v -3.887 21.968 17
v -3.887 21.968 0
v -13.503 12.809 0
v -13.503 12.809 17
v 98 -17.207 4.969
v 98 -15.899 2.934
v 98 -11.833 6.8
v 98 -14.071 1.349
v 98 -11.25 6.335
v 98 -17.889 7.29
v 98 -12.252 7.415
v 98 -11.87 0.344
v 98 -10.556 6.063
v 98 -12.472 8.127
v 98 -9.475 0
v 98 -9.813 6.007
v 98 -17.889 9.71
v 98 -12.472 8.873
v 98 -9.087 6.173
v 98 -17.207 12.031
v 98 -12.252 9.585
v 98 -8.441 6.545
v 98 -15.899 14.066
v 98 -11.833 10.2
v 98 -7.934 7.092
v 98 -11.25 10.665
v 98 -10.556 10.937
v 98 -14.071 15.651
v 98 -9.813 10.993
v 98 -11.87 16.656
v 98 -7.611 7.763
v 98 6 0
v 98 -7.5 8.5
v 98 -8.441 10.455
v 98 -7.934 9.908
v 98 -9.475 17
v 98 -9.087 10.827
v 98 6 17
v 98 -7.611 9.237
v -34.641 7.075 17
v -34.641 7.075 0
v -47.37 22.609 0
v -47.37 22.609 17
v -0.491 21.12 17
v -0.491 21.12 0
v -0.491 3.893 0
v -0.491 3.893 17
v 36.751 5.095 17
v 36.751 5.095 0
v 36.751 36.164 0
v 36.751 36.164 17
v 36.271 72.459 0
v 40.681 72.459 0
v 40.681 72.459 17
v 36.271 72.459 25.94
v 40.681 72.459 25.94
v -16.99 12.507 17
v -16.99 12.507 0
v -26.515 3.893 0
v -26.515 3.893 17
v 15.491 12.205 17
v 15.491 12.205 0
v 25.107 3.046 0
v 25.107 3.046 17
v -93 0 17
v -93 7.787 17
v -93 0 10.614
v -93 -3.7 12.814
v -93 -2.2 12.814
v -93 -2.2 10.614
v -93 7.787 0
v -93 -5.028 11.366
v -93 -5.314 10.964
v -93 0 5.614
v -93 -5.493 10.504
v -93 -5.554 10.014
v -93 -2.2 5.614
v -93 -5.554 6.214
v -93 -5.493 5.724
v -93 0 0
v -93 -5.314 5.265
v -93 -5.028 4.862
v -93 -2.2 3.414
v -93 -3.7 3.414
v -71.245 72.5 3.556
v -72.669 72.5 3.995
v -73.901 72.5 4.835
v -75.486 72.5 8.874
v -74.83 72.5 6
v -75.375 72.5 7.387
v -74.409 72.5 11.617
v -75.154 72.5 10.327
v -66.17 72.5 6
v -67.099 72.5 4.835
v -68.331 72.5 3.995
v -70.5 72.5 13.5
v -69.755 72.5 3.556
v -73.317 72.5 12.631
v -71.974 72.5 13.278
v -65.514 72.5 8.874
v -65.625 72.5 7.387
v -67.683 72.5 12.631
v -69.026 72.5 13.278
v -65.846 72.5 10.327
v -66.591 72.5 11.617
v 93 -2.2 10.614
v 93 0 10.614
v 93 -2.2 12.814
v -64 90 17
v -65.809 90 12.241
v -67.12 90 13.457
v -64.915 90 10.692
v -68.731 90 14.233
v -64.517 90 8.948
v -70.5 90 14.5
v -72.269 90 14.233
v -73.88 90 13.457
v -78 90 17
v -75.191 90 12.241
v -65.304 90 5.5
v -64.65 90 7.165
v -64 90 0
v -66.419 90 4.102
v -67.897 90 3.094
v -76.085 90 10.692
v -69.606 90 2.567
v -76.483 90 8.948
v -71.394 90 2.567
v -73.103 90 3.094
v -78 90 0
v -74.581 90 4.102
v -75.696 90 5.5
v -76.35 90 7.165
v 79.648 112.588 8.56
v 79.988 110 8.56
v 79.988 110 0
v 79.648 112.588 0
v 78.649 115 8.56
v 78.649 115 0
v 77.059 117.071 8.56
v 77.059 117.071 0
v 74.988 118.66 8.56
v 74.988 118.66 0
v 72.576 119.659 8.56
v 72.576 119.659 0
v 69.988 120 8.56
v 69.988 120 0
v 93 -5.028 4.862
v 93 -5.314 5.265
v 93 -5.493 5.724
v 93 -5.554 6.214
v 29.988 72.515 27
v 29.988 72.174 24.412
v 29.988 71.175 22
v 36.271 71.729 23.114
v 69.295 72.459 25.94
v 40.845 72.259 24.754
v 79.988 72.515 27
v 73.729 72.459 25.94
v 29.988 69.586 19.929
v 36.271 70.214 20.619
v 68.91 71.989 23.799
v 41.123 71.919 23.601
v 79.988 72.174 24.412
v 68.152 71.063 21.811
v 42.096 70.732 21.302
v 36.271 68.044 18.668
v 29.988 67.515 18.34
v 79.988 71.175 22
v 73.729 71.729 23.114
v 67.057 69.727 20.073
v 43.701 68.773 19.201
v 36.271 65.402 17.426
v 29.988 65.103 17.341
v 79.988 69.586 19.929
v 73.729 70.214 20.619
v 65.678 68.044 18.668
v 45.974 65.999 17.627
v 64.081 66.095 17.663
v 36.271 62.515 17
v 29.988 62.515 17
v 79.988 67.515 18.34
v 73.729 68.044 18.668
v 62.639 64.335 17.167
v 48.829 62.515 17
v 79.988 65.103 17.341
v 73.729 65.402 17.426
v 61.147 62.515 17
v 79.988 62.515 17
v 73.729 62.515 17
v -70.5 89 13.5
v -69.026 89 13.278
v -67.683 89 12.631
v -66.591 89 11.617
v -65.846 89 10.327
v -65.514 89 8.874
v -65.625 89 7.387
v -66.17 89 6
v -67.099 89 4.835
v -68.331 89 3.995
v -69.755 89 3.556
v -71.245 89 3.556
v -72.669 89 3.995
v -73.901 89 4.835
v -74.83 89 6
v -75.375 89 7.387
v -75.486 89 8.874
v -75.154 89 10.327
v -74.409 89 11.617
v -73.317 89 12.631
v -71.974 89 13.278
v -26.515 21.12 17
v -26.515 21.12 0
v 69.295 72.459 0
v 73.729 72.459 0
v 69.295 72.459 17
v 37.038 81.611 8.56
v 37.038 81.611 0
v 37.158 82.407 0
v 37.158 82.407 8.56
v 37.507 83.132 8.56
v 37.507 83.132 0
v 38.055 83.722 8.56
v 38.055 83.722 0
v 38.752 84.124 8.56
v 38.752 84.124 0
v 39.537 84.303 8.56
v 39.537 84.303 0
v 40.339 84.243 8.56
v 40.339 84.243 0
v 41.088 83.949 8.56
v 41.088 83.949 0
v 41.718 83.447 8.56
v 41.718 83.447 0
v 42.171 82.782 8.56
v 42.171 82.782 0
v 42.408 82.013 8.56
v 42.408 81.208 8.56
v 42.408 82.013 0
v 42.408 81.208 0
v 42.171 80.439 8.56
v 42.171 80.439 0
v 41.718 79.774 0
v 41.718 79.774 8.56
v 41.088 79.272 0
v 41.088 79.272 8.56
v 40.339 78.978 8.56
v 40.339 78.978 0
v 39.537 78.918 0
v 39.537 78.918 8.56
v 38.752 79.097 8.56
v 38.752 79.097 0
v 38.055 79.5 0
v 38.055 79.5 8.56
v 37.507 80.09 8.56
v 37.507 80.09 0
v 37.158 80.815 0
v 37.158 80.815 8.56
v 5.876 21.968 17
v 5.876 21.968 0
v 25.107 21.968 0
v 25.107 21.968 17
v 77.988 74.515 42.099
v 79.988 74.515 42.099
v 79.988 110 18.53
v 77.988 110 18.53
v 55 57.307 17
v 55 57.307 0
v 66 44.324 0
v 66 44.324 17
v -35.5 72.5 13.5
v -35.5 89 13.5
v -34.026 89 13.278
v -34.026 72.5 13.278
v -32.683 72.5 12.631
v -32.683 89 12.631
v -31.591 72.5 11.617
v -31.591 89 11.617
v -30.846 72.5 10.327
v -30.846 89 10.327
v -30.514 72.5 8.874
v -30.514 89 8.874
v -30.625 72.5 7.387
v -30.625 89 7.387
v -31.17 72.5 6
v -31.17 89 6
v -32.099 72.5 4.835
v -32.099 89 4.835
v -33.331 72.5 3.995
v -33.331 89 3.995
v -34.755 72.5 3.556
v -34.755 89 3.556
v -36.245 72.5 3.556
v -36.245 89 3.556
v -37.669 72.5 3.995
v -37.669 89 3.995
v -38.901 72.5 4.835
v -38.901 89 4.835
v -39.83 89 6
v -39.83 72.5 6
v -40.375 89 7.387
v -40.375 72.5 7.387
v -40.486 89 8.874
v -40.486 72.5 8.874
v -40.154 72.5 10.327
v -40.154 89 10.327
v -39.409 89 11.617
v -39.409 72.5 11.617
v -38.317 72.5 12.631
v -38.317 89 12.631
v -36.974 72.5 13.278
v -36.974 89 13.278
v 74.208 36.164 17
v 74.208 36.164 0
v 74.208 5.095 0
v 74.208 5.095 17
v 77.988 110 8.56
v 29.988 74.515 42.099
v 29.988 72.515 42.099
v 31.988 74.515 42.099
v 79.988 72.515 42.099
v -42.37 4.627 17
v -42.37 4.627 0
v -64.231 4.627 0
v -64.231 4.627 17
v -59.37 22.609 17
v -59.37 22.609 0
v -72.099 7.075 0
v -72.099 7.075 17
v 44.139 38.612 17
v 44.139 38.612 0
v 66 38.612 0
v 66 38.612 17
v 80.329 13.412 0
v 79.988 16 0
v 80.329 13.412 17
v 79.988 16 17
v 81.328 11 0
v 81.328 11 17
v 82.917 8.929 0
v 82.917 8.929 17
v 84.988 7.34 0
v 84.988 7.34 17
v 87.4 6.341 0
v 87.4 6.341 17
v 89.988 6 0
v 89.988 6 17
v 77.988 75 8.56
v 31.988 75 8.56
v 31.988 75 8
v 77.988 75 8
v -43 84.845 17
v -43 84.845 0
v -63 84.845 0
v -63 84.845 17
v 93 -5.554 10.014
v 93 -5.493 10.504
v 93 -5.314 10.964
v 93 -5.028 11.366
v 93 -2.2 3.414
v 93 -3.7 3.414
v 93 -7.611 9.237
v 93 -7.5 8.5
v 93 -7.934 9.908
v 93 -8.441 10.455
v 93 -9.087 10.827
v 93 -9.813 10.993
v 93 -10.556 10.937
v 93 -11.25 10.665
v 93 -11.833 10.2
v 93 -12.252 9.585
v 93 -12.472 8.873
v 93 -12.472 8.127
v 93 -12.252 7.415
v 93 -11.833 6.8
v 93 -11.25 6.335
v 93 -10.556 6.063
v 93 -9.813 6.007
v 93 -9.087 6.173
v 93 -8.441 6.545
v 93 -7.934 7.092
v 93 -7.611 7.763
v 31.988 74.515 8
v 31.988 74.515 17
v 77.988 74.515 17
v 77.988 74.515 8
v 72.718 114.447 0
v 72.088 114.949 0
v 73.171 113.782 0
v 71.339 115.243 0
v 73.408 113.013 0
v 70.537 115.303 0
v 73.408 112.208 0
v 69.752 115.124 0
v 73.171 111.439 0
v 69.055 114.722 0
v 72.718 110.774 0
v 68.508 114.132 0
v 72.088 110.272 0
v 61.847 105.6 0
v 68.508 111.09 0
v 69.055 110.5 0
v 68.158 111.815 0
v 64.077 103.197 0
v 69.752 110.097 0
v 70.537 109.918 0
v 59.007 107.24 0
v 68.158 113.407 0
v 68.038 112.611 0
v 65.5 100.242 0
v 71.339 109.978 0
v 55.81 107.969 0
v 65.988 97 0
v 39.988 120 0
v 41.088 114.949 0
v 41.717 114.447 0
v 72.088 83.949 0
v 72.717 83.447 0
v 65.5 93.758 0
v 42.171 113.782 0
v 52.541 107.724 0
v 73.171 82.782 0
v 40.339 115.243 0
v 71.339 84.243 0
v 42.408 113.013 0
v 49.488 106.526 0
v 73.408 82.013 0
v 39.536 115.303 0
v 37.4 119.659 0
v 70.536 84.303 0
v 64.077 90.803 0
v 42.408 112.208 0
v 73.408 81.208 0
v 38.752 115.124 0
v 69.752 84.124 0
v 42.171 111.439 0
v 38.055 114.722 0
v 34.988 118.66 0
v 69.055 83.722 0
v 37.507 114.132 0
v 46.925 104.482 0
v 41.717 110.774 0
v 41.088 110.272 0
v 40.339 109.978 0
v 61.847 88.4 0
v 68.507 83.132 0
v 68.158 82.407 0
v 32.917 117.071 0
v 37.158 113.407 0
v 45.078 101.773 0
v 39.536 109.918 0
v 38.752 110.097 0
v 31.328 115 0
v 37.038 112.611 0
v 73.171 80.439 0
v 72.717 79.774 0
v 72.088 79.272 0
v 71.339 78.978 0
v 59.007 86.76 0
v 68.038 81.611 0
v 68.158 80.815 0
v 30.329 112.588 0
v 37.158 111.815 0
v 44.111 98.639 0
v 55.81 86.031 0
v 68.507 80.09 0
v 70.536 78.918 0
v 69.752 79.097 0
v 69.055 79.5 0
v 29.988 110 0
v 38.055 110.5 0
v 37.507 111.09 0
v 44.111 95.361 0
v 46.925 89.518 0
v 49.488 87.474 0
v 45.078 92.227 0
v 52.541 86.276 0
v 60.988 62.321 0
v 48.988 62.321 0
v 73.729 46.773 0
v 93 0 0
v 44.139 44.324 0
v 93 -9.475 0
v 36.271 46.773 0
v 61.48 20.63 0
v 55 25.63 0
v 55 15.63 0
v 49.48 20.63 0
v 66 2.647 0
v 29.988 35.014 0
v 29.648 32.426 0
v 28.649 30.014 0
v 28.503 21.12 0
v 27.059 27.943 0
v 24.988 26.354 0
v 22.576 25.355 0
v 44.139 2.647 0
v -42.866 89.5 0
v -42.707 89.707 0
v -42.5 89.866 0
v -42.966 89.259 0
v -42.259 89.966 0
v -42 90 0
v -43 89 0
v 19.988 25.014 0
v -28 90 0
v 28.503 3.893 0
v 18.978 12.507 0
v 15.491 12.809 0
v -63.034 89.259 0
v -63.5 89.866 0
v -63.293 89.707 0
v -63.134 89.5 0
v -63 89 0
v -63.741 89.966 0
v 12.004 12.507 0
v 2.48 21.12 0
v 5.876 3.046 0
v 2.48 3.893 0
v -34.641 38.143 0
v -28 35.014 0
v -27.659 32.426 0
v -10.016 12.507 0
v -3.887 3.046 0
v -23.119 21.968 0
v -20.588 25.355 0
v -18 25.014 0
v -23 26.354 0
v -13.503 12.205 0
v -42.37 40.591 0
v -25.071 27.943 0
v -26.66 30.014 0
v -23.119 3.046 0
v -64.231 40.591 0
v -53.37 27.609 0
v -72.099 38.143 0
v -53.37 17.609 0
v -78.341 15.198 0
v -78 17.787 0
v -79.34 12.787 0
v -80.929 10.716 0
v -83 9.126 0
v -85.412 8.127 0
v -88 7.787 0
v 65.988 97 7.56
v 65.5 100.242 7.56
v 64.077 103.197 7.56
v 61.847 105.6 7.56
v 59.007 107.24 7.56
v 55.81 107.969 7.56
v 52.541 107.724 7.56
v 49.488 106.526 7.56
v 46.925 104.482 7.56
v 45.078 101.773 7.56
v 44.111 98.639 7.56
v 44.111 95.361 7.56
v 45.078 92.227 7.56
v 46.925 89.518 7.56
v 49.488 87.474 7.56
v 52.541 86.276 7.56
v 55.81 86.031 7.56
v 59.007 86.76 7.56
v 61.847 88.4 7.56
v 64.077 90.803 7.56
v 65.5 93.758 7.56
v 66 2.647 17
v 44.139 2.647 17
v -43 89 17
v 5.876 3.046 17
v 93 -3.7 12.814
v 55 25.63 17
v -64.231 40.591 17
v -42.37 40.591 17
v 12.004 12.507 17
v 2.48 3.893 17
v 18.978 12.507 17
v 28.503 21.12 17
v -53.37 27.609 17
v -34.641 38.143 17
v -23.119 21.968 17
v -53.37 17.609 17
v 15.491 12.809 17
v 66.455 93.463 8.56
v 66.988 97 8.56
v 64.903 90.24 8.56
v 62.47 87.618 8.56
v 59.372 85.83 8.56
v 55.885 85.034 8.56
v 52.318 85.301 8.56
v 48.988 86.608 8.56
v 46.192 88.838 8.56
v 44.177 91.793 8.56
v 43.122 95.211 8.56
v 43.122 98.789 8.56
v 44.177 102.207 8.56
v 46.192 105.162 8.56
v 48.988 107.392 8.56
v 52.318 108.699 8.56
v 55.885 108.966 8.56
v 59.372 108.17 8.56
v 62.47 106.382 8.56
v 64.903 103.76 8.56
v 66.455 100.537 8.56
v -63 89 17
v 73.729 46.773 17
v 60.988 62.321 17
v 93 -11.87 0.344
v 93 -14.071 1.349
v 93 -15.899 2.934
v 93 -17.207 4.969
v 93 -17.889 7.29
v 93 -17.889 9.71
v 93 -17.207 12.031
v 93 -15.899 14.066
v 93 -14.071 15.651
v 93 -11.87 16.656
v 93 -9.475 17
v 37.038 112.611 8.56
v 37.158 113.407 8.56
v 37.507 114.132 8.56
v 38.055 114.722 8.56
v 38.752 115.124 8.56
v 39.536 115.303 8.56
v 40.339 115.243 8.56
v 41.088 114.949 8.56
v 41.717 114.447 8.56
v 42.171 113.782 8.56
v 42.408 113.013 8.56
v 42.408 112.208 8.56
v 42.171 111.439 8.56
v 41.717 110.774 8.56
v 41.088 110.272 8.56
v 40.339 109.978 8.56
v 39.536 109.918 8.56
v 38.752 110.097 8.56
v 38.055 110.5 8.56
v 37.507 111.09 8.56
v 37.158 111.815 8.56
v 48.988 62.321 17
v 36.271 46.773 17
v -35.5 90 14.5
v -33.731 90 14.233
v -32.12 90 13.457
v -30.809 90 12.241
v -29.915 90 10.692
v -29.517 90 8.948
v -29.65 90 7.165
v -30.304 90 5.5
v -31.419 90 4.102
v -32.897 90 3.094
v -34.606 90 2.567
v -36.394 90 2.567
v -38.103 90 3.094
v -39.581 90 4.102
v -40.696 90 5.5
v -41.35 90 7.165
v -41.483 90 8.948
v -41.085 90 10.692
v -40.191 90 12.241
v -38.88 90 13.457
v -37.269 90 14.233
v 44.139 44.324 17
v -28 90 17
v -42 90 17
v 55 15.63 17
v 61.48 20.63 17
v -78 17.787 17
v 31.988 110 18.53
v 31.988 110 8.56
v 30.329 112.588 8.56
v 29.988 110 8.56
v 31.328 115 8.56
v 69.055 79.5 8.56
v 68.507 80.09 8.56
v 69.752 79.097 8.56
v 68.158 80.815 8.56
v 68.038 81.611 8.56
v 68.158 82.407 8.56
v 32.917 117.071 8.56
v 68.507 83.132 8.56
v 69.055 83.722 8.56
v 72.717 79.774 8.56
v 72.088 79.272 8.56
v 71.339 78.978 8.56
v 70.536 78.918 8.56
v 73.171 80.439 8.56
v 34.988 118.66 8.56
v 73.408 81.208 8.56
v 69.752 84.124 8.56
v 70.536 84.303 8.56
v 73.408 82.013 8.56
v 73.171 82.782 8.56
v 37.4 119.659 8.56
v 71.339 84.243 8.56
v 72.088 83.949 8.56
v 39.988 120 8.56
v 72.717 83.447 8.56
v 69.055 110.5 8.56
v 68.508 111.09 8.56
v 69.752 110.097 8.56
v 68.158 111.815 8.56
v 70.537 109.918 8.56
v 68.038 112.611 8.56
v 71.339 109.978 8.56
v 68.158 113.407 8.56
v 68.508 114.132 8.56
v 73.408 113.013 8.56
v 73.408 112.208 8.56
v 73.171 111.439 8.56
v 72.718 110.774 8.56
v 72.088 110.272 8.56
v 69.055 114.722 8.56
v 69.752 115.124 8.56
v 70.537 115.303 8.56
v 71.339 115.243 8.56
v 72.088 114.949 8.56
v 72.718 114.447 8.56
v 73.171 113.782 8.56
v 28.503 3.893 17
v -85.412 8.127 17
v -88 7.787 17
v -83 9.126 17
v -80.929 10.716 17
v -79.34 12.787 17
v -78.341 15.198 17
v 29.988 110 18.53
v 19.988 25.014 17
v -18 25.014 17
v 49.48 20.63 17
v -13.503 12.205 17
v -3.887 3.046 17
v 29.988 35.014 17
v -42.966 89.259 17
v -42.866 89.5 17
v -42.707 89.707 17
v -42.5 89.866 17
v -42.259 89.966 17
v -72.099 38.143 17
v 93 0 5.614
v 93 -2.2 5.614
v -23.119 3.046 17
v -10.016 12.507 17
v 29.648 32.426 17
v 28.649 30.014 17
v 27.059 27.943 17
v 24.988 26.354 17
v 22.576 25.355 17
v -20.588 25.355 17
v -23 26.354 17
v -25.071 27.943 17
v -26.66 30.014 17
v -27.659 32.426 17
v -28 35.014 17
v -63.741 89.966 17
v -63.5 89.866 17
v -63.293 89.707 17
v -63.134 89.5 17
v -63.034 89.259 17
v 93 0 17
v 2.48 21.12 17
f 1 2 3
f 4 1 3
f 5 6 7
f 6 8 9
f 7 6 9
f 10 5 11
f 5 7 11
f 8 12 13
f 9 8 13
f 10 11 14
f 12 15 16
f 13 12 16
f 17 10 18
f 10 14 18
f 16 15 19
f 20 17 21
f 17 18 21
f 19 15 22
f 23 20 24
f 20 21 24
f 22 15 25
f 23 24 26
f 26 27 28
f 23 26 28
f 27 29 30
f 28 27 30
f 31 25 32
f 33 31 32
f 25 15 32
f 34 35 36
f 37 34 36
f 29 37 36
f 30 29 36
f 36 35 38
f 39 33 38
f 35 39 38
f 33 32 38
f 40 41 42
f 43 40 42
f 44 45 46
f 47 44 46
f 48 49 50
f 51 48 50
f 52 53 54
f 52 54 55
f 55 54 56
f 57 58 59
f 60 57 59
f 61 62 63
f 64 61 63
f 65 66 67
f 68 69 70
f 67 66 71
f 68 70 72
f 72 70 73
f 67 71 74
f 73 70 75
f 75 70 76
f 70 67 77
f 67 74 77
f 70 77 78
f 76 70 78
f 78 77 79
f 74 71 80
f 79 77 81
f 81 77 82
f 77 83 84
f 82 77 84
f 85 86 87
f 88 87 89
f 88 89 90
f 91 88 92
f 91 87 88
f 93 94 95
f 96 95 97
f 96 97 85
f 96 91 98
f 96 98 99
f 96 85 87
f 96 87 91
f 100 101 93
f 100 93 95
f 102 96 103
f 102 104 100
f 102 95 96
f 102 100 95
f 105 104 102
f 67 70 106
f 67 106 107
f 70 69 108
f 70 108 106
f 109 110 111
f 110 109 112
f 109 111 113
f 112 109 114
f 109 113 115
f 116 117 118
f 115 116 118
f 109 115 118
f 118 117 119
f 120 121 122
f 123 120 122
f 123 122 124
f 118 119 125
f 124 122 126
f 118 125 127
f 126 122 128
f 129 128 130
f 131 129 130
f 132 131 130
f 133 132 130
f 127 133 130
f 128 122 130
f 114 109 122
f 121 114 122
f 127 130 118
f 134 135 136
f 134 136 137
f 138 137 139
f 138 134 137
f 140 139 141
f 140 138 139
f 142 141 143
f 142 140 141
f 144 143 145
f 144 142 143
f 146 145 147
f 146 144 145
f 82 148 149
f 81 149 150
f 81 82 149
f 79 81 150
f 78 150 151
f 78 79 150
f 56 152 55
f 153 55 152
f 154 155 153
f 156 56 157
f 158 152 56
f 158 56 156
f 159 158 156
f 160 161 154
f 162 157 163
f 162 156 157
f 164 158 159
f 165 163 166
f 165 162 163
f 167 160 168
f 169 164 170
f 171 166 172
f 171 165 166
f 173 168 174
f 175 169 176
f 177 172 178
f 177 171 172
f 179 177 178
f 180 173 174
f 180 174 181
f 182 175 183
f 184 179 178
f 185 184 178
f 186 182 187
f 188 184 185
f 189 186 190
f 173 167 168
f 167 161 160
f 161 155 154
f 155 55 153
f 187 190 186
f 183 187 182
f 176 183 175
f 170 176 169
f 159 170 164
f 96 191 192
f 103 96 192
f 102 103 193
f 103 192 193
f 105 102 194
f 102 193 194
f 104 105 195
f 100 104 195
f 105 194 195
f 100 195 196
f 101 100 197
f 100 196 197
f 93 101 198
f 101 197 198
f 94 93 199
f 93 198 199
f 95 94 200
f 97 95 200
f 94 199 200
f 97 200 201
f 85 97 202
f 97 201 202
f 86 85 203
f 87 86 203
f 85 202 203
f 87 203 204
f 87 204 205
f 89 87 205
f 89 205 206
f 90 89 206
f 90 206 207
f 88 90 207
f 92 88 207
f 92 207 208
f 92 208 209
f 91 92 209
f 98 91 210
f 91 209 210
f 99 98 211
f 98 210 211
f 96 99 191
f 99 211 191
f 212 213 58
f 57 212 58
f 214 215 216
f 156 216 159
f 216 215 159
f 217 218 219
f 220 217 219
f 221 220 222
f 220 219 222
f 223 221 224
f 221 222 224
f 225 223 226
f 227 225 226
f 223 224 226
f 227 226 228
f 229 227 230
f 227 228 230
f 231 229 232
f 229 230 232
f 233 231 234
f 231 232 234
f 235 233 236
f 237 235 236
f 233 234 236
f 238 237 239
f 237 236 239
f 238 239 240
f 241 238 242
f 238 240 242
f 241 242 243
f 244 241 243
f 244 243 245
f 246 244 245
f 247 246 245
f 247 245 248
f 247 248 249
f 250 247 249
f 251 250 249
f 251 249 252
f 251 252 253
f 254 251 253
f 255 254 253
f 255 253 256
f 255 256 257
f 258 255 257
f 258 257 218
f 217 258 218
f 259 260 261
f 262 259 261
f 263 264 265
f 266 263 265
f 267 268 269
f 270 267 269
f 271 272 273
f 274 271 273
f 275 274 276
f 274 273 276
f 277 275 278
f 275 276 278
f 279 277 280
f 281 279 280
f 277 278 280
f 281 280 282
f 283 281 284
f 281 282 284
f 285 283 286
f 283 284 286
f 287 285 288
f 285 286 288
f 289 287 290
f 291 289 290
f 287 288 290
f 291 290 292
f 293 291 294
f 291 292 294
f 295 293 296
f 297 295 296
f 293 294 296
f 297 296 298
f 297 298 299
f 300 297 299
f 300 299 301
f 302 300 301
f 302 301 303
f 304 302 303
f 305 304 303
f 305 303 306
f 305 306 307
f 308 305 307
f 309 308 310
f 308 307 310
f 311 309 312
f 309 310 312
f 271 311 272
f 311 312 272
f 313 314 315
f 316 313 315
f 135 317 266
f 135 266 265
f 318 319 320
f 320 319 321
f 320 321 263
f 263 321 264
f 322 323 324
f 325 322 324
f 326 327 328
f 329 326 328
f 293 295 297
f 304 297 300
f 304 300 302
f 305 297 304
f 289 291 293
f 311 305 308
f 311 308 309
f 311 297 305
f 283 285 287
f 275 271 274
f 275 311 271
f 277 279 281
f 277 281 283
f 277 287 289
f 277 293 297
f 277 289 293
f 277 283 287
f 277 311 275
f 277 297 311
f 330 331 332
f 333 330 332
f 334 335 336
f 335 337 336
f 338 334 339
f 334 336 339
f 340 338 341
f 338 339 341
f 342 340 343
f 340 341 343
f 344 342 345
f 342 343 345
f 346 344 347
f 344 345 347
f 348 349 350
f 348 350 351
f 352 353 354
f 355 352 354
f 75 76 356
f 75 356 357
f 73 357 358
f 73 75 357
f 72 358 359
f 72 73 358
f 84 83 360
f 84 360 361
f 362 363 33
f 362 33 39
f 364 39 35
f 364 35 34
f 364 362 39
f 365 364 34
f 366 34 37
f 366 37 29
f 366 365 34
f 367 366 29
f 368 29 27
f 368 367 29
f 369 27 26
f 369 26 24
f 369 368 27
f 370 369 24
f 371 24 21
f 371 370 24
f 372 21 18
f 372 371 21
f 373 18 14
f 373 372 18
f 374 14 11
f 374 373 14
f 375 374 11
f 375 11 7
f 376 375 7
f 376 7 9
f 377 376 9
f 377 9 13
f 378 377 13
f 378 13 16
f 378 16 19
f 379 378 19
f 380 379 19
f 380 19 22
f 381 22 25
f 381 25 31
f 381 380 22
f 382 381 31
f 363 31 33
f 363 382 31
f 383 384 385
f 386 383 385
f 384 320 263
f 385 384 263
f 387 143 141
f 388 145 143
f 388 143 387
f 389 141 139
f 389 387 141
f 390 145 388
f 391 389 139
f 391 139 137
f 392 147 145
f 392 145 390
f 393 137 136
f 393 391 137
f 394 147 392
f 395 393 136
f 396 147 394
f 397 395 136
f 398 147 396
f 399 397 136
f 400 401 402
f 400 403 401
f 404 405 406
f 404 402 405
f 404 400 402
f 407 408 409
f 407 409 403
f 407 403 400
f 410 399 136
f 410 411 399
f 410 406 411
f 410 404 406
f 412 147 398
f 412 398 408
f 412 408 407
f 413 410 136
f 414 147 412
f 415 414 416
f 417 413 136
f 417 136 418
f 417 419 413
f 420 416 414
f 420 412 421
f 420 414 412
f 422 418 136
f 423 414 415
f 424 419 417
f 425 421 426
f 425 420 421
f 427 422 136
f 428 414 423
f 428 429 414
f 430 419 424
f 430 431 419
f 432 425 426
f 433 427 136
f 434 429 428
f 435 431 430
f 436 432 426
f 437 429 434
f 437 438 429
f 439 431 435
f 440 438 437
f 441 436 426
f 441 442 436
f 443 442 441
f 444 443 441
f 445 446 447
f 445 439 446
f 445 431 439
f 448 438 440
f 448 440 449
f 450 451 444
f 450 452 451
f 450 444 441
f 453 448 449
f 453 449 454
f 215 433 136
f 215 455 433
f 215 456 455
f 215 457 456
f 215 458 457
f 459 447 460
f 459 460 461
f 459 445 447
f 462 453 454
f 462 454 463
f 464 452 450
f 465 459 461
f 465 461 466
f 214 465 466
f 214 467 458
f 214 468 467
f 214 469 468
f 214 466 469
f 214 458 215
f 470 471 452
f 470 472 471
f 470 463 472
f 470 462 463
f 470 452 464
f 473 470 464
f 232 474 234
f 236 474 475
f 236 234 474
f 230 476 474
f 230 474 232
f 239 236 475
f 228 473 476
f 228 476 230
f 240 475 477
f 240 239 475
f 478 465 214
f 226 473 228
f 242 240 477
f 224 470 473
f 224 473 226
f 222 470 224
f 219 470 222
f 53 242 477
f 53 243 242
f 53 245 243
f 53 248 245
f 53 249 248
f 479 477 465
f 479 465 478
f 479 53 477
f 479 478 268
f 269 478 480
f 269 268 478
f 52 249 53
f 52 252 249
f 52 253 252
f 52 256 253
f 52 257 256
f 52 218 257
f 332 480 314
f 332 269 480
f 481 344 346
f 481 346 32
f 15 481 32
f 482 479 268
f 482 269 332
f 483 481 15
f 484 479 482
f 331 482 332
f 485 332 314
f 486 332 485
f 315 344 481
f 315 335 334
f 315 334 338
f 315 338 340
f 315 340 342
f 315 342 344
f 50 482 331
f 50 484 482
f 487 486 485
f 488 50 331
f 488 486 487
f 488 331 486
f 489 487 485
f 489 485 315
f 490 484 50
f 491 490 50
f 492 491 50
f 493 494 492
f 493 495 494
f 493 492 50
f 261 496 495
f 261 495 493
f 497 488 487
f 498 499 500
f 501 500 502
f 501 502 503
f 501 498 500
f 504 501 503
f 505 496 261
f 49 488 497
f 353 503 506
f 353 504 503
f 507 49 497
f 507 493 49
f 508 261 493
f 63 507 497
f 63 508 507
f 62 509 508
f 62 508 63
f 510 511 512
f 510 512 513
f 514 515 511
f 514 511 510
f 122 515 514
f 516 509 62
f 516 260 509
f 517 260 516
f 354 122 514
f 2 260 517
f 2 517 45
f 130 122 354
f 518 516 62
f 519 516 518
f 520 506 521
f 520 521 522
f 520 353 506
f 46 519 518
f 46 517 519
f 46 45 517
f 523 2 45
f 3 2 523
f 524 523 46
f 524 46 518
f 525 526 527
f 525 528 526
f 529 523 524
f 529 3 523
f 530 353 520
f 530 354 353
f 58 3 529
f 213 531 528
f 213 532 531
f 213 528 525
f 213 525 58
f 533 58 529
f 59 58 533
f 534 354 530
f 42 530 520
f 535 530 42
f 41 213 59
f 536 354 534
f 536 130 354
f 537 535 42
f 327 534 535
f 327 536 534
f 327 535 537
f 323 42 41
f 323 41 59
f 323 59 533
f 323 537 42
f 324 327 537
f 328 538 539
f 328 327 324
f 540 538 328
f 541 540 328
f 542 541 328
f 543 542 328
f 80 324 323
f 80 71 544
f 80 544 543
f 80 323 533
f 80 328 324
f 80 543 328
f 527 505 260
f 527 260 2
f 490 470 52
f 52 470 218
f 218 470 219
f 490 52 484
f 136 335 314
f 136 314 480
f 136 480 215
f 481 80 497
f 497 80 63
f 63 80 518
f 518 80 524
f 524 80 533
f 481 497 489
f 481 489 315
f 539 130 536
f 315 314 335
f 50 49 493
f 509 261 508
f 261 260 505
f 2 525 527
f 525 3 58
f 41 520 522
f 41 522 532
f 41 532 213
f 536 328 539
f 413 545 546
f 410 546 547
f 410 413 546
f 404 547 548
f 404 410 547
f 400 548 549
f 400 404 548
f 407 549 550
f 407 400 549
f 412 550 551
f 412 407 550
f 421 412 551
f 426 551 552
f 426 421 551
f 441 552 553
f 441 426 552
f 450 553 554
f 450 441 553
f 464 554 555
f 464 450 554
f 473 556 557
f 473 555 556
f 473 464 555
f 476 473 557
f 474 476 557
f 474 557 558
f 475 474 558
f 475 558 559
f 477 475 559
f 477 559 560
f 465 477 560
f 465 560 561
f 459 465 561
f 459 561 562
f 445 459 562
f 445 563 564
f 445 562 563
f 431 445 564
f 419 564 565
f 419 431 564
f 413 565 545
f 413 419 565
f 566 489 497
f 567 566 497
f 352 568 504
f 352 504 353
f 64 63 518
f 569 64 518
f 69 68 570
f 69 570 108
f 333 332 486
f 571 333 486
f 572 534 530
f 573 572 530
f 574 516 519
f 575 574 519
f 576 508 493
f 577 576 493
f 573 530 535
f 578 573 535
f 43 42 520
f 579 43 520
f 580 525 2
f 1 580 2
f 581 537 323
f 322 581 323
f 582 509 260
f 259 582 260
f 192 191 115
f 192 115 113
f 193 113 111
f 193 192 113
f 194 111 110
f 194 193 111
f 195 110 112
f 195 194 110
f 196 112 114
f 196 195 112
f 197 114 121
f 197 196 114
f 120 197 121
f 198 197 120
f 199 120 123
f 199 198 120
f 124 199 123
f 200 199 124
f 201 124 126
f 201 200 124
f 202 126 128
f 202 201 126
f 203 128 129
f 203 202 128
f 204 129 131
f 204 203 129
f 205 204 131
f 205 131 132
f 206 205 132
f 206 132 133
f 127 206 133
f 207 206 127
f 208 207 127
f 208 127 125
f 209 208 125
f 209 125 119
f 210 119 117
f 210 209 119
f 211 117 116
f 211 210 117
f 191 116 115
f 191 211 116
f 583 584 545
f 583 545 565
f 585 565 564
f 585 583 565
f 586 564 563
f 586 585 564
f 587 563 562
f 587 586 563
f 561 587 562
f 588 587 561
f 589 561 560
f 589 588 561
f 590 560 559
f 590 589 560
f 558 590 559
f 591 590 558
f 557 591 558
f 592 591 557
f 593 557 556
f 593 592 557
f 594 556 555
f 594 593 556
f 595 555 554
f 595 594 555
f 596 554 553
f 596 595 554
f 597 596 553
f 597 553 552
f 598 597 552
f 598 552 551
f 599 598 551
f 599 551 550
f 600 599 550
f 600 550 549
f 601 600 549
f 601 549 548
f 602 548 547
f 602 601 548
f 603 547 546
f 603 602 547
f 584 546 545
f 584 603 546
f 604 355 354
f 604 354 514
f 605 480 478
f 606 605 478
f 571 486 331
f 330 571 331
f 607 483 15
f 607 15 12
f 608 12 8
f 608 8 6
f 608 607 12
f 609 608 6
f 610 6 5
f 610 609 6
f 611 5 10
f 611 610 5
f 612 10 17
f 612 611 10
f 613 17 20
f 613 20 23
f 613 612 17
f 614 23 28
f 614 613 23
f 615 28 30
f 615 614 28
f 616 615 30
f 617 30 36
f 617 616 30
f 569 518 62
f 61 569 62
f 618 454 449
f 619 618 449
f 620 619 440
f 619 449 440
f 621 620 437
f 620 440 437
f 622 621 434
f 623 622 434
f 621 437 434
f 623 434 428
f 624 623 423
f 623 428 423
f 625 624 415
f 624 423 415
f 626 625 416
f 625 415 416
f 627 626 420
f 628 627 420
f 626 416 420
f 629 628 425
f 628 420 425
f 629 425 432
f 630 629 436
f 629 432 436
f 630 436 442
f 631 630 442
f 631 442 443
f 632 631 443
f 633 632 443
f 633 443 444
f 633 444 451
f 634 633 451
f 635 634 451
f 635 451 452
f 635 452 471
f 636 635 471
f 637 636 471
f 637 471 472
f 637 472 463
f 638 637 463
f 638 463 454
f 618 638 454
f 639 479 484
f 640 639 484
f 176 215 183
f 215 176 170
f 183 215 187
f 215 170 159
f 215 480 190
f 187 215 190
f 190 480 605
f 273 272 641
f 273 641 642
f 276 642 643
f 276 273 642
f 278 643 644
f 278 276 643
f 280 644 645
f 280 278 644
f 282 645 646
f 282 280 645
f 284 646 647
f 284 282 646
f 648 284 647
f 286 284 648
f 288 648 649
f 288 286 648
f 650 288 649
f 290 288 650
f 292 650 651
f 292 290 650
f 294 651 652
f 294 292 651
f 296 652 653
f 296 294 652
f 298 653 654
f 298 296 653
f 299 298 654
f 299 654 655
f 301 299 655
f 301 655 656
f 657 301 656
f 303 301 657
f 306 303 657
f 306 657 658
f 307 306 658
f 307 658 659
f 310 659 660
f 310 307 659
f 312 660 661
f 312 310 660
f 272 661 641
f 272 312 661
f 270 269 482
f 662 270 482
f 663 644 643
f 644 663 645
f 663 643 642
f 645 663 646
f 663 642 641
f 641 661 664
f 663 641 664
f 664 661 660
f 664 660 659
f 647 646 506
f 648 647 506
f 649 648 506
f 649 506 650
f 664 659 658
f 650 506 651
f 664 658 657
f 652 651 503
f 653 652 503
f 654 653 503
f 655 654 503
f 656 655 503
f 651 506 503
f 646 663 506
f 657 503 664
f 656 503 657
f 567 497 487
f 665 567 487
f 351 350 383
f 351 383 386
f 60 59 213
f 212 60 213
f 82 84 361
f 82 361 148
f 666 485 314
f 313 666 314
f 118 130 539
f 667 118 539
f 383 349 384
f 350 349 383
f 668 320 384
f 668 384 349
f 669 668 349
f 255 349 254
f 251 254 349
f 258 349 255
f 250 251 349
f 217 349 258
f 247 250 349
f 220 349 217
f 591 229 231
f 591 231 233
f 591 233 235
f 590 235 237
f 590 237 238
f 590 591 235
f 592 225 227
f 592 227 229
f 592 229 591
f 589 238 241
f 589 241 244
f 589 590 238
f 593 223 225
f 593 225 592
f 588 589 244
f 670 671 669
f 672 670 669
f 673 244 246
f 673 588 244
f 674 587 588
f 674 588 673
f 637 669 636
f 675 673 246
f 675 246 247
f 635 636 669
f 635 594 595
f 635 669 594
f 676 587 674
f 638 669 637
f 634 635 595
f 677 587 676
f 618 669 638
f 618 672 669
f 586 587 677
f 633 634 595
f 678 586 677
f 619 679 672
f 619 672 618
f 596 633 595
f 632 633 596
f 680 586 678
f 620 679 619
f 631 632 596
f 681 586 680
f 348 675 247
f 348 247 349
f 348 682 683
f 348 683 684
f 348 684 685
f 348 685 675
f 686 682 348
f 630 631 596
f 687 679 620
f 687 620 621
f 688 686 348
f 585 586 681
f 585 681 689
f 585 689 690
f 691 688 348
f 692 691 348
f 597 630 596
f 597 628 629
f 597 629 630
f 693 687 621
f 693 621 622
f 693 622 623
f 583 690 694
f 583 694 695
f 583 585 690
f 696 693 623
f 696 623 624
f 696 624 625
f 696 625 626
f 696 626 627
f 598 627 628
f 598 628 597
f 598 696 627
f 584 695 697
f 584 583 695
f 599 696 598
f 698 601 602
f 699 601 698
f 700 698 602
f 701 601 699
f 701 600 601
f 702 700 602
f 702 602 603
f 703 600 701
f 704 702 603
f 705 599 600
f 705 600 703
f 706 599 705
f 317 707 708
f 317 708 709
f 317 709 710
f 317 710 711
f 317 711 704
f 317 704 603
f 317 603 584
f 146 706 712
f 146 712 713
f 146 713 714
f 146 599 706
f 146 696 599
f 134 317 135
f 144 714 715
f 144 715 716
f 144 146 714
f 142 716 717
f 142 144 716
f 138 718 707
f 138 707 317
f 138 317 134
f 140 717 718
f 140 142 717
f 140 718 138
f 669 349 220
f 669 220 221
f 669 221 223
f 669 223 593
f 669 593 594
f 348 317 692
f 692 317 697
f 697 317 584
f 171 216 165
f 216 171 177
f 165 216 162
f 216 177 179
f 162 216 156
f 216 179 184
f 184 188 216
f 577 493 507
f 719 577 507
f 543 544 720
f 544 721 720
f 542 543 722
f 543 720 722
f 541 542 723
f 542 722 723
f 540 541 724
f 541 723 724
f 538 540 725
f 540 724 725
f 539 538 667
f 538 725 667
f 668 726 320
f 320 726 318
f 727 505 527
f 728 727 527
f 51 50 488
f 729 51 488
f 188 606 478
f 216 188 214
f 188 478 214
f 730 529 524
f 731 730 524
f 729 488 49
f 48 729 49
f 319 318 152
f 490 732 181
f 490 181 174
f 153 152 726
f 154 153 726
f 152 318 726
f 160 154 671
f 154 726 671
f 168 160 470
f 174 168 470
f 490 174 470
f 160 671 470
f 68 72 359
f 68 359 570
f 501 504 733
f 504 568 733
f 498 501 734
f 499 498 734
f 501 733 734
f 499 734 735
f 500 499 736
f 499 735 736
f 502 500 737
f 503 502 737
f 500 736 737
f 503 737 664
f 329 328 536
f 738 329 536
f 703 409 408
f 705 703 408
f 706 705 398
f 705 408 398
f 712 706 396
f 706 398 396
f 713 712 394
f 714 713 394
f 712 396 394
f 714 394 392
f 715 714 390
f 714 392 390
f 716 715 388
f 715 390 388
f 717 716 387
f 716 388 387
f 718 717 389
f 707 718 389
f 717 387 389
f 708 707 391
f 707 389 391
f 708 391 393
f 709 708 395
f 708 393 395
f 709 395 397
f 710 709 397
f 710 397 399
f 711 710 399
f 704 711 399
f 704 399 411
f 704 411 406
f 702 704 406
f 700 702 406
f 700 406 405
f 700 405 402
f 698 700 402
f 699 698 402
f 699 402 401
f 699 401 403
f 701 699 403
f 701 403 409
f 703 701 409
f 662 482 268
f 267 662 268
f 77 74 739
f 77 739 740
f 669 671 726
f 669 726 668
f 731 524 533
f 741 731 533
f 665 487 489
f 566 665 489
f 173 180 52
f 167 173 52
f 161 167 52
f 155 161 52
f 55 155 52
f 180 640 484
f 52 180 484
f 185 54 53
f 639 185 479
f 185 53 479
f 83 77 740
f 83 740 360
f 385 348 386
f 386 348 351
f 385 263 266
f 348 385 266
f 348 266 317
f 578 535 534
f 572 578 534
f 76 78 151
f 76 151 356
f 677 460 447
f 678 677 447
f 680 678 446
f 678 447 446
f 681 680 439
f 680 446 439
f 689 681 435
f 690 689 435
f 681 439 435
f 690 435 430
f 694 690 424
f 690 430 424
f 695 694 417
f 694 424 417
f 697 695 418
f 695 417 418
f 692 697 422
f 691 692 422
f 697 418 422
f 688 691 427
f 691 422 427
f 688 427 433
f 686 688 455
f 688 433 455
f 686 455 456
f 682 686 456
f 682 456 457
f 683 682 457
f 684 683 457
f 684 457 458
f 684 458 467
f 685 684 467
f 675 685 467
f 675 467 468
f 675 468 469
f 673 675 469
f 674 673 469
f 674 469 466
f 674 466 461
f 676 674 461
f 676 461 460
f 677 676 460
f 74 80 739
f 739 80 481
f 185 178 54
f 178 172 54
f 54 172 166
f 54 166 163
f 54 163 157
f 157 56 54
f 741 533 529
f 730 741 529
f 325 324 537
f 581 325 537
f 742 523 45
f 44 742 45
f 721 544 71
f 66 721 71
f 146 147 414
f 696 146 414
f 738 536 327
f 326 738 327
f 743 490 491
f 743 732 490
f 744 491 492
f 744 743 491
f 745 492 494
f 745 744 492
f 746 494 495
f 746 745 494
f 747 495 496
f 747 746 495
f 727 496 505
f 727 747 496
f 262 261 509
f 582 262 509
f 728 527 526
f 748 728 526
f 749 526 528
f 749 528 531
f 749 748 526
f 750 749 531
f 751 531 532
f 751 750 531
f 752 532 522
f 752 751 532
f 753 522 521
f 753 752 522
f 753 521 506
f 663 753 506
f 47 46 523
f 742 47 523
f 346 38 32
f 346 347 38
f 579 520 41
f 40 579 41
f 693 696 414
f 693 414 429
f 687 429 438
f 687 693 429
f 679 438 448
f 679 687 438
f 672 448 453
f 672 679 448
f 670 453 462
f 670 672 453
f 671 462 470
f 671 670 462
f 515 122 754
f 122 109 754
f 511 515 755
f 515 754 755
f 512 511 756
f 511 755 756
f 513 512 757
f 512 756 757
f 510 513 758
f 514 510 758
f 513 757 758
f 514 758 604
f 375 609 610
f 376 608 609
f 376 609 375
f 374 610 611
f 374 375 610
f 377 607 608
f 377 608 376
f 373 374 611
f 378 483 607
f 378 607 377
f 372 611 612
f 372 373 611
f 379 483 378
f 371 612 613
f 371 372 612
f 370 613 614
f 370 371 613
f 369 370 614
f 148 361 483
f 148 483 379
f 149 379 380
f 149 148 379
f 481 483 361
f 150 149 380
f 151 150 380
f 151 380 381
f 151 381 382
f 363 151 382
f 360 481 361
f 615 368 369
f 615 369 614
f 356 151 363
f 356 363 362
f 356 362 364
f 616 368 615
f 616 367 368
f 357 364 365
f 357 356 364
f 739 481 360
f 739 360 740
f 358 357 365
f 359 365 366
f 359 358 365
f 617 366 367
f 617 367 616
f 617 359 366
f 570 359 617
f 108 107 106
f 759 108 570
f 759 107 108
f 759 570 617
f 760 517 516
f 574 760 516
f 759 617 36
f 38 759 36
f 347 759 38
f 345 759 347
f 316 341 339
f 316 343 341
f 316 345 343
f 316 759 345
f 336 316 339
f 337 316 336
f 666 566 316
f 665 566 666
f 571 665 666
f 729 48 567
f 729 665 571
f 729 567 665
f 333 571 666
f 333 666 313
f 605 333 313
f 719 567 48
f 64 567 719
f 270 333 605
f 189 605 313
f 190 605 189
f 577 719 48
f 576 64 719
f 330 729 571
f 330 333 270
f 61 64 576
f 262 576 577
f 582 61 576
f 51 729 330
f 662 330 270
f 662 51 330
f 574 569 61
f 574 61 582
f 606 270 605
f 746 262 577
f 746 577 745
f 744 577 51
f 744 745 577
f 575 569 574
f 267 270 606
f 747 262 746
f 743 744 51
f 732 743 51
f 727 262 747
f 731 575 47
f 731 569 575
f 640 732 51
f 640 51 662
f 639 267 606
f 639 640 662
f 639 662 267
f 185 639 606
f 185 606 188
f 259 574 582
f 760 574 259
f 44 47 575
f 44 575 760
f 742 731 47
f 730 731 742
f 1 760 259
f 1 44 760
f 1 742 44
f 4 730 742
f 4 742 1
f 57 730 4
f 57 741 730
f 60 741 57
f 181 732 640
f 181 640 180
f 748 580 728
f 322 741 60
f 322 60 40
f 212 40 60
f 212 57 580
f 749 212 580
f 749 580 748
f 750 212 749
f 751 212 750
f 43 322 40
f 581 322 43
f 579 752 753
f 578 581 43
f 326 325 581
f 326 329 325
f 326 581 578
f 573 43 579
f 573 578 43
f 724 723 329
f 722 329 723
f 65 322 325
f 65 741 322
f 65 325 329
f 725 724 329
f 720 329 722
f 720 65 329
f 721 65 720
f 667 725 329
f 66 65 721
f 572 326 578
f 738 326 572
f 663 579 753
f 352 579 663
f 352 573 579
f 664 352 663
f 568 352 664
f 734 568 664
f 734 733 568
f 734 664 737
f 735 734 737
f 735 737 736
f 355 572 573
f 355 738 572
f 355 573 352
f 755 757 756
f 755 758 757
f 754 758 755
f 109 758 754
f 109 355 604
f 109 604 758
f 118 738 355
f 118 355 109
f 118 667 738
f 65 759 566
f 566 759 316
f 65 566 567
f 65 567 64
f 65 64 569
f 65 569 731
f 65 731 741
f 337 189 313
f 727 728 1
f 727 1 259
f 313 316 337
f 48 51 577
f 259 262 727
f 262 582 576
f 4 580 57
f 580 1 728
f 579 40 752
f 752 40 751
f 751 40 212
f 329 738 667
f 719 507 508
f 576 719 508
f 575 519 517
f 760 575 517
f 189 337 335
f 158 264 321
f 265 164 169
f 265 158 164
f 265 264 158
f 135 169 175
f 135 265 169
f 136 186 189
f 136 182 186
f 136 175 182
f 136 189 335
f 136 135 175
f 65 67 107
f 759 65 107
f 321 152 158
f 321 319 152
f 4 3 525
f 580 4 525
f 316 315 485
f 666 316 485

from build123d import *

# Parameters (mm, degrees)
CROQUIS1_R                = 11
SALIENTE_EXTRUIR1_DEPTH   = 17
REDONDEO1_R               = 10
REDONDEO2_R               = 10
REDONDEO8_R               = 10
REDONDEO9_R               = 10
REDONDEO11_R              = 10
REDONDEO12_R              = 10
SALIENTE_EXTRUIR2_DEPTH   = 186
CROQUIS5_R                = 2.5
SALIENTE_EXTRUIR6_DEPTH   = 5
CORTAR_EXTRUIR5_START     = -5
CORTAR_EXTRUIR5_OUTLINE_R = 11
CORTAR_EXTRUIR5_DEPTH     = 5
SALIENTE_EXTRUIR7_DEPTH   = 2
SALIENTE_EXTRUIR8_DEPTH   = 2
CROQUIS16_W               = 46
CROQUIS16_H               = 26.427047574
SALIENTE_EXTRUIR9_DEPTH   = 2
CROQUIS18_W               = 50
CROQUIS18_H               = 8.439754805
CORTAR_EXTRUIR7_DEPTH     = 45
CROQUIS19_W               = 2
CROQUIS19_H               = 8.439754805
SALIENTE_EXTRUIR10_DEPTH  = 35
CROQUIS20_W               = 46
CROQUIS20_H               = 0.485157357
CORTAR_EXTRUIR8_DEPTH     = 9
REDONDEO13_R              = 10
SKETCH1_W                 = 1.328368311
SKETCH1_H                 = 2
CUT_EXTRUDE1_DEPTH        = 215.967115272
SKETCH3_R                 = 2.7
CUT_EXTRUDE2_DEPTH        = 161.549988464
SKETCH4_R                 = 5
CUT_EXTRUDE3_DEPTH        = 17.5
FILLET1_R                 = 1
CHAMFER1_SIZE             = 1


# Read off the part's stored shape, not the designer's step: Cortar-Extruir5
with BuildPart() as part:
    # Croquis1 → Saliente-Extruir1 (new body)
    with BuildSketch(Plane.XY):
        Polygon((-93, 0), (93, 0), (93, 6), (79.988300723, 6), (79.988300723, 120), (29.988300723, 120), (29.988300723, 25.013938177), (-28, 25.013938177), (-28, 90), (-43, 90), (-43, 84.845258293), (-63, 84.845258293), (-63, 90), (-78, 90), (-78, 7.786589187), (-93, 7.786589187), align=None)
        Polygon((-53.370368055, 17.608830496), (-42.369998576, 4.626570416), (-64.231453048, 4.626570416), align=None, mode=Mode.SUBTRACT)
        Polygon((-72.099249791, 38.14298816), (-59.370368055, 22.608830496), (-72.099249791, 7.074672833), align=None, mode=Mode.SUBTRACT)
        Polygon((-3.887274434, 3.04639267), (-23.118575204, 3.04639267), (-13.502924819, 12.205387461), align=None, mode=Mode.SUBTRACT)
        Polygon((-26.514516656, 3.893494584), (-26.514516656, 21.120443592), (-16.989907544, 12.506969088), align=None, mode=Mode.SUBTRACT)
        Polygon((-10.015942094, 12.506969088), (-0.491332982, 21.120443592), (-0.491332982, 3.893494584), align=None, mode=Mode.SUBTRACT)
        Polygon((-34.641486319, 7.074672833), (-47.370368055, 22.608830496), (-34.641486319, 38.14298816), align=None, mode=Mode.SUBTRACT)
        Polygon((-13.502924819, 12.808550716), (-23.118575204, 21.967545507), (-3.887274434, 21.967545507), align=None, mode=Mode.SUBTRACT)
        Polygon((-53.370368055, 27.608830496), (-64.231453048, 40.591090577), (-42.369998576, 40.591090577), align=None, mode=Mode.SUBTRACT)
        Polygon((2.479633706, 3.893494584), (2.479633706, 21.120443592), (12.004242818, 12.506969088), align=None, mode=Mode.SUBTRACT)
        Polygon((5.875575158, 3.04639267), (15.491225543, 12.205387461), (25.106875927, 3.04639267), align=None, mode=Mode.SUBTRACT)
        Polygon((28.50281738, 21.120443592), (28.50281738, 3.893494584), (18.978208267, 12.506969088), align=None, mode=Mode.SUBTRACT)
        Polygon((5.875575158, 21.967545507), (25.106875927, 21.967545507), (15.491225543, 12.808550716), align=None, mode=Mode.SUBTRACT)
        Polygon((36.750632631, 36.163668304), (49.479514367, 20.629510641), (36.750632631, 5.095352977), align=None, mode=Mode.SUBTRACT)
        Polygon((55, 15.629510641), (66.000369479, 2.64725056), (44.138915007, 2.64725056), align=None, mode=Mode.SUBTRACT)
        Polygon((74.208396103, 5.095352977), (61.479514367, 20.629510641), (74.208396103, 36.163668304), align=None, mode=Mode.SUBTRACT)
        Polygon((40.681467462, 72.45853374), (48.988300723, 62.320985113), (36.271118264, 46.772549809), (36.271118264, 72.45853374), align=None, mode=Mode.SUBTRACT)
        Polygon((55, 25.629510641), (44.138915007, 38.611770721), (66.000369479, 38.611770721), align=None, mode=Mode.SUBTRACT)
        Polygon((55, 57.306707472), (66.000369479, 44.324447392), (44.138915007, 44.324447392), align=None, mode=Mode.SUBTRACT)
        Polygon((73.728881736, 46.772549809), (60.988300723, 62.320985113), (69.295133985, 72.45853374), (73.728881736, 72.45853374), align=None, mode=Mode.SUBTRACT)
        with Locations((54.988300723, 97)):
            Circle(CROQUIS1_R, mode=Mode.SUBTRACT)
    extrude(amount=SALIENTE_EXTRUIR1_DEPTH)

    # Redondeo1
    redondeo1_edges = [part.edges().sort_by_distance(p)[0] for p in [
        (79.988300723, 120, 8.5),
    ]]
    fillet(redondeo1_edges, radius=REDONDEO1_R)

    # Redondeo2
    redondeo2_edges = [part.edges().sort_by_distance(p)[0] for p in [
        (29.988300723, 120, 8.5),
    ]]
    fillet(redondeo2_edges, radius=REDONDEO2_R)

    # Redondeo8
    redondeo8_edges = [part.edges().sort_by_distance(p)[0] for p in [
        (29.988300723, 25.013938177, 8.5),
    ]]
    fillet(redondeo8_edges, radius=REDONDEO8_R)

    # Redondeo9
    redondeo9_edges = [part.edges().sort_by_distance(p)[0] for p in [
        (-28, 25.013938177, 8.5),
    ]]
    fillet(redondeo9_edges, radius=REDONDEO9_R)

    # Redondeo11
    redondeo11_edges = [part.edges().sort_by_distance(p)[0] for p in [
        (79.988300723, 6, 8.5),
    ]]
    fillet(redondeo11_edges, radius=REDONDEO11_R)

    # Redondeo12
    redondeo12_edges = [part.edges().sort_by_distance(p)[0] for p in [
        (-78, 7.786589187, 8.5),
    ]]
    fillet(redondeo12_edges, radius=REDONDEO12_R)

    # Croquis4 → Saliente-Extruir2 (add)
    with BuildSketch(Plane.ZY.offset(93)):
        with BuildLine():
            Line((5.614135824, 0), (5.614135824, -2.2))
            Line((5.614135824, -2.2), (3.414135824, -2.2))
            Line((3.414135824, -2.2), (3.414135824, -3.7))
            Line((3.414135824, -3.7), (4.862457658, -5.028042266))
            ThreePointArc((4.862457658, -5.028042266), (5.488945101, -5.4178372), (6.214135824, -5.553943851))
            Line((6.214135824, -5.553943851), (10.014135824, -5.553943851))
            ThreePointArc((10.014135824, -5.553943851), (10.739326546, -5.4178372), (11.365813989, -5.028042266))
            Line((11.365813989, -5.028042266), (12.814135824, -3.7))
            Line((12.814135824, -3.7), (12.814135824, -2.2))
            Line((12.814135824, -2.2), (10.614135824, -2.2))
            Line((10.614135824, -2.2), (10.614135824, 0))
            Line((10.614135824, 0), (5.614135824, 0))
        make_face()
    extrude(amount=-SALIENTE_EXTRUIR2_DEPTH)

    # Croquis5 → Saliente-Extruir6 (add)
    with BuildSketch(Plane(origin=(93, 0, 0), x_dir=(0, 0, -1), z_dir=(1, 0, 0))):
        with BuildLine():
            Line((-17, 6), (0, 6))
            Line((0, 6), (0, 0))
            Line((0, 0), (0, -9.475176398))
            ThreePointArc((0, -9.475176398), (-8.5, -17.975176398), (-17, -9.475176398))
            Line((-17, -9.475176398), (-17, 0))
            Line((-17, 0), (-17, 6))
        make_face()
        with Locations(Location((-8.5, -10, 0), (0, 0, 90))):
            Circle(CROQUIS5_R, mode=Mode.SUBTRACT)
    extrude(amount=SALIENTE_EXTRUIR6_DEPTH)

    # Cortar-Extruir5 outline → Cortar-Extruir5 (cut)
    with BuildSketch(Plane.XY.offset(17).offset(CORTAR_EXTRUIR5_START)):
        with BuildLine():
            ThreePointArc((36.990583657, 100.021275878), (34.88853317, 96.589149148), (37.130323879, 93.246622476))
            Line((37.130323879, 93.246622476), (49.081988054, 86.302507362))
            ThreePointArc((49.081988054, 86.302507362), (55.135782124, 84.669748862), (61.191322119, 86.29602016))
            Line((61.191322119, 86.29602016), (73.177641255, 93.243103052))
            ThreePointArc((73.177641255, 93.243103052), (75.516378848, 96.608558865), (73.365004561, 100.096763995))
            Line((73.365004561, 100.096763995), (61.202501164, 107.163380194))
            ThreePointArc((61.202501164, 107.163380194), (55.196638443, 108.796017791), (49.176296726, 107.217607778))
            Line((49.176296726, 107.217607778), (36.990583657, 100.021275878))
        make_face()
        with Locations((54.988300723, 97)):
            Circle(CORTAR_EXTRUIR5_OUTLINE_R, mode=Mode.SUBTRACT)
    extrude(amount=CORTAR_EXTRUIR5_DEPTH, mode=Mode.SUBTRACT)

    # Croquis14 → Saliente-Extruir7 (add)
    with BuildSketch(Plane(origin=(79.988300723, 0, 0), x_dir=(0, 0, -1), z_dir=(1, 0, 0))):
        Polygon((-17, 110), (-17, 72.514842643), (-43.427047574, 72.514842643), (-18.53, 110), align=None)
    extrude(amount=-SALIENTE_EXTRUIR7_DEPTH)

    # Croquis15 → Saliente-Extruir8 (add)
    with BuildSketch(Plane.ZY.offset(-29.988300723)):
        Polygon((17, 110), (18.53, 110), (43.427047574, 72.514842643), (17, 72.514842643), align=None)
    extrude(amount=-SALIENTE_EXTRUIR8_DEPTH)

    # Croquis16 → Saliente-Extruir9 (add)
    with BuildSketch(Plane.XZ.offset(-72.514842643)):
        with Locations((54.988300723, 30.213523787)):
            Rectangle(CROQUIS16_W, CROQUIS16_H)
    extrude(amount=-SALIENTE_EXTRUIR9_DEPTH)

    # Croquis18 → Cortar-Extruir7 (cut)
    with BuildSketch(Plane(origin=(0, 120, 0), x_dir=(1, 0, 0), z_dir=(0, 1, 0))):
        with Locations((54.988300723, -12.780122598)):
            Rectangle(CROQUIS18_W, CROQUIS18_H)
    extrude(amount=-CORTAR_EXTRUIR7_DEPTH, mode=Mode.SUBTRACT)

    # Croquis19 → Saliente-Extruir10 (add)
    with BuildSketch(Plane(origin=(0, 110, 0), x_dir=(1, 0, 0), z_dir=(0, 1, 0))):
        with Locations((78.988300723, -12.780122598)):
            Rectangle(CROQUIS19_W, CROQUIS19_H)
        with Locations((30.988300723, -12.780122598)):
            Rectangle(CROQUIS19_W, CROQUIS19_H)
    extrude(amount=-SALIENTE_EXTRUIR10_DEPTH)

    # Croquis20 → Cortar-Extruir8 (cut)
    with BuildSketch(Plane.XY.offset(17)):
        with Locations((54.988300723, 74.757421322)):
            Rectangle(CROQUIS20_W, CROQUIS20_H)
    extrude(amount=-CORTAR_EXTRUIR8_DEPTH, mode=Mode.SUBTRACT)

    # Redondeo13
    # the kernel refuses this fillet: 10 mm, written as the material it adds along each edge
    with BuildSketch(Plane(origin=(79.988300723, 72.514842643, 17), x_dir=(0, 0, 1), z_dir=(-1, 0, 0))) as redondeo13_piece_1_section:
        with BuildLine():
            CenterArc((REDONDEO13_R, -REDONDEO13_R), REDONDEO13_R, 90, 90)
            Line((0, -REDONDEO13_R), (0, 0))
            Line((0, 0), (REDONDEO13_R, 0))
        make_face()
    redondeo13_piece_1 = extrude(amount=50, mode=Mode.PRIVATE)
    redondeo13_piece_1 = split(redondeo13_piece_1, bisect_by=Plane(origin=(76.85859123, 72.45853374, 21.649915329), z_dir=(0, 1, 0)), keep=Keep.TOP, mode=Mode.PRIVATE)
    add(redondeo13_piece_1)
    with BuildSketch(Plane(origin=(79.988300723, 72.514842643, 17), x_dir=(0, 0, 1), z_dir=(-1, 0, 0))) as redondeo13_piece_2_section:
        with BuildLine():
            CenterArc((REDONDEO13_R, -REDONDEO13_R), REDONDEO13_R, 90, 90)
            Line((0, -REDONDEO13_R), (0, 0))
            Line((0, 0), (REDONDEO13_R, 0))
        make_face()
    redondeo13_piece_2 = extrude(amount=75, mode=Mode.PRIVATE)
    redondeo13_piece_2 = split(redondeo13_piece_2, bisect_by=Plane(origin=(73.728881736, 70.226028868, 19.173289303), z_dir=(1, 0, 0)), keep=Keep.TOP, mode=Mode.PRIVATE)
    add(redondeo13_piece_2)
    with BuildSketch(Plane(origin=(104.988300723, 72.514842643, 17), x_dir=(0, 0, 1), z_dir=(-1, 0, 0))) as redondeo13_piece_3_section:
        with BuildLine():
            CenterArc((REDONDEO13_R, -REDONDEO13_R), REDONDEO13_R, 90, 90)
            Line((0, -REDONDEO13_R), (0, 0))
            Line((0, 0), (REDONDEO13_R, 0))
        make_face()
    redondeo13_piece_3 = extrude(amount=100, mode=Mode.PRIVATE)
    redondeo13_piece_3 = split(redondeo13_piece_3, bisect_by=Plane(origin=(62.565438467, 64.245703, 19.303543537), z_dir=(-0.7734905837611198, 0.6338077917104541, 0)), keep=Keep.TOP, mode=Mode.PRIVATE)
    redondeo13_piece_3 = split(redondeo13_piece_3, bisect_by=Plane(origin=(47.41116298, 64.245703, 19.303543537), z_dir=(0.7734905837611216, 0.6338077917104518, 0)), keep=Keep.TOP, mode=Mode.PRIVATE)
    add(redondeo13_piece_3)
    with BuildSketch(Plane(origin=(104.988300723, 72.514842643, 17), x_dir=(0, 0, 1), z_dir=(-1, 0, 0))) as redondeo13_piece_4_section:
        with BuildLine():
            CenterArc((REDONDEO13_R, -REDONDEO13_R), REDONDEO13_R, 90, 90)
            Line((0, -REDONDEO13_R), (0, 0))
            Line((0, 0), (REDONDEO13_R, 0))
        make_face()
    redondeo13_piece_4 = extrude(amount=75, mode=Mode.PRIVATE)
    redondeo13_piece_4 = split(redondeo13_piece_4, bisect_by=Plane(origin=(36.271118264, 70.226028868, 19.173289303), z_dir=(-1, 0, 0)), keep=Keep.TOP, mode=Mode.PRIVATE)
    add(redondeo13_piece_4)

    # Sketch1 → Cut-Extrude1 (cut, through all)
    with BuildSketch(Plane(origin=(79.988300723, 0, 0), x_dir=(0, 0, -1), z_dir=(1, 0, 0))):
        with Locations((-42.762863419, 73.514842643)):
            Rectangle(SKETCH1_W, SKETCH1_H)
    extrude(amount=-CUT_EXTRUDE1_DEPTH, mode=Mode.SUBTRACT)

    # Sketch3 → Cut-Extrude2 (cut, through all)
    with BuildSketch(Plane(origin=(0, 0, 0), x_dir=(-1, 0, 0), z_dir=(0, 0, -1))):
        with Locations((-70.738454865, 112.610749995)):
            Circle(SKETCH3_R)
        with Locations((-39.738300723, 81.610750001)):
            Circle(SKETCH3_R)
        with Locations((-70.738129703, 81.610750001)):
            Circle(SKETCH3_R)
        with Locations((-39.73822367, 112.610749995)):
            Circle(SKETCH3_R)
    extrude(amount=-CUT_EXTRUDE2_DEPTH, mode=Mode.SUBTRACT)

    # Sketch4 → Cut-Extrude3 (cut)
    with BuildSketch(Plane(origin=(0, 90, 0), x_dir=(1, 0, 0), z_dir=(0, 1, 0))):
        with Locations(Location((-70.5, -8.5, 0), (0, 0, 270))):
            Circle(SKETCH4_R)
        with Locations(Location((-35.5, -8.5, 0), (0, 0, 270))):
            Circle(SKETCH4_R)
    extrude(amount=-CUT_EXTRUDE3_DEPTH, mode=Mode.SUBTRACT)

    # Fillet1
    fillet1_edges = [part.edges().sort_by_distance(p)[0] for p in [
        (-63, 90, 8.5),
        (-43, 90, 8.5),
    ]]
    fillet(fillet1_edges, radius=FILLET1_R)

    # Chamfer1
    chamfer1_edges = [part.edges().sort_by_distance(p)[0] for p in [
        (43.988300723, 97, 8.560245195),
        (-70.5, 90, 3.5),
        (-35.5, 90, 3.5),
    ]]
    chamfer(chamfer1_edges, length=CHAMFER1_SIZE)


solid = part.part
